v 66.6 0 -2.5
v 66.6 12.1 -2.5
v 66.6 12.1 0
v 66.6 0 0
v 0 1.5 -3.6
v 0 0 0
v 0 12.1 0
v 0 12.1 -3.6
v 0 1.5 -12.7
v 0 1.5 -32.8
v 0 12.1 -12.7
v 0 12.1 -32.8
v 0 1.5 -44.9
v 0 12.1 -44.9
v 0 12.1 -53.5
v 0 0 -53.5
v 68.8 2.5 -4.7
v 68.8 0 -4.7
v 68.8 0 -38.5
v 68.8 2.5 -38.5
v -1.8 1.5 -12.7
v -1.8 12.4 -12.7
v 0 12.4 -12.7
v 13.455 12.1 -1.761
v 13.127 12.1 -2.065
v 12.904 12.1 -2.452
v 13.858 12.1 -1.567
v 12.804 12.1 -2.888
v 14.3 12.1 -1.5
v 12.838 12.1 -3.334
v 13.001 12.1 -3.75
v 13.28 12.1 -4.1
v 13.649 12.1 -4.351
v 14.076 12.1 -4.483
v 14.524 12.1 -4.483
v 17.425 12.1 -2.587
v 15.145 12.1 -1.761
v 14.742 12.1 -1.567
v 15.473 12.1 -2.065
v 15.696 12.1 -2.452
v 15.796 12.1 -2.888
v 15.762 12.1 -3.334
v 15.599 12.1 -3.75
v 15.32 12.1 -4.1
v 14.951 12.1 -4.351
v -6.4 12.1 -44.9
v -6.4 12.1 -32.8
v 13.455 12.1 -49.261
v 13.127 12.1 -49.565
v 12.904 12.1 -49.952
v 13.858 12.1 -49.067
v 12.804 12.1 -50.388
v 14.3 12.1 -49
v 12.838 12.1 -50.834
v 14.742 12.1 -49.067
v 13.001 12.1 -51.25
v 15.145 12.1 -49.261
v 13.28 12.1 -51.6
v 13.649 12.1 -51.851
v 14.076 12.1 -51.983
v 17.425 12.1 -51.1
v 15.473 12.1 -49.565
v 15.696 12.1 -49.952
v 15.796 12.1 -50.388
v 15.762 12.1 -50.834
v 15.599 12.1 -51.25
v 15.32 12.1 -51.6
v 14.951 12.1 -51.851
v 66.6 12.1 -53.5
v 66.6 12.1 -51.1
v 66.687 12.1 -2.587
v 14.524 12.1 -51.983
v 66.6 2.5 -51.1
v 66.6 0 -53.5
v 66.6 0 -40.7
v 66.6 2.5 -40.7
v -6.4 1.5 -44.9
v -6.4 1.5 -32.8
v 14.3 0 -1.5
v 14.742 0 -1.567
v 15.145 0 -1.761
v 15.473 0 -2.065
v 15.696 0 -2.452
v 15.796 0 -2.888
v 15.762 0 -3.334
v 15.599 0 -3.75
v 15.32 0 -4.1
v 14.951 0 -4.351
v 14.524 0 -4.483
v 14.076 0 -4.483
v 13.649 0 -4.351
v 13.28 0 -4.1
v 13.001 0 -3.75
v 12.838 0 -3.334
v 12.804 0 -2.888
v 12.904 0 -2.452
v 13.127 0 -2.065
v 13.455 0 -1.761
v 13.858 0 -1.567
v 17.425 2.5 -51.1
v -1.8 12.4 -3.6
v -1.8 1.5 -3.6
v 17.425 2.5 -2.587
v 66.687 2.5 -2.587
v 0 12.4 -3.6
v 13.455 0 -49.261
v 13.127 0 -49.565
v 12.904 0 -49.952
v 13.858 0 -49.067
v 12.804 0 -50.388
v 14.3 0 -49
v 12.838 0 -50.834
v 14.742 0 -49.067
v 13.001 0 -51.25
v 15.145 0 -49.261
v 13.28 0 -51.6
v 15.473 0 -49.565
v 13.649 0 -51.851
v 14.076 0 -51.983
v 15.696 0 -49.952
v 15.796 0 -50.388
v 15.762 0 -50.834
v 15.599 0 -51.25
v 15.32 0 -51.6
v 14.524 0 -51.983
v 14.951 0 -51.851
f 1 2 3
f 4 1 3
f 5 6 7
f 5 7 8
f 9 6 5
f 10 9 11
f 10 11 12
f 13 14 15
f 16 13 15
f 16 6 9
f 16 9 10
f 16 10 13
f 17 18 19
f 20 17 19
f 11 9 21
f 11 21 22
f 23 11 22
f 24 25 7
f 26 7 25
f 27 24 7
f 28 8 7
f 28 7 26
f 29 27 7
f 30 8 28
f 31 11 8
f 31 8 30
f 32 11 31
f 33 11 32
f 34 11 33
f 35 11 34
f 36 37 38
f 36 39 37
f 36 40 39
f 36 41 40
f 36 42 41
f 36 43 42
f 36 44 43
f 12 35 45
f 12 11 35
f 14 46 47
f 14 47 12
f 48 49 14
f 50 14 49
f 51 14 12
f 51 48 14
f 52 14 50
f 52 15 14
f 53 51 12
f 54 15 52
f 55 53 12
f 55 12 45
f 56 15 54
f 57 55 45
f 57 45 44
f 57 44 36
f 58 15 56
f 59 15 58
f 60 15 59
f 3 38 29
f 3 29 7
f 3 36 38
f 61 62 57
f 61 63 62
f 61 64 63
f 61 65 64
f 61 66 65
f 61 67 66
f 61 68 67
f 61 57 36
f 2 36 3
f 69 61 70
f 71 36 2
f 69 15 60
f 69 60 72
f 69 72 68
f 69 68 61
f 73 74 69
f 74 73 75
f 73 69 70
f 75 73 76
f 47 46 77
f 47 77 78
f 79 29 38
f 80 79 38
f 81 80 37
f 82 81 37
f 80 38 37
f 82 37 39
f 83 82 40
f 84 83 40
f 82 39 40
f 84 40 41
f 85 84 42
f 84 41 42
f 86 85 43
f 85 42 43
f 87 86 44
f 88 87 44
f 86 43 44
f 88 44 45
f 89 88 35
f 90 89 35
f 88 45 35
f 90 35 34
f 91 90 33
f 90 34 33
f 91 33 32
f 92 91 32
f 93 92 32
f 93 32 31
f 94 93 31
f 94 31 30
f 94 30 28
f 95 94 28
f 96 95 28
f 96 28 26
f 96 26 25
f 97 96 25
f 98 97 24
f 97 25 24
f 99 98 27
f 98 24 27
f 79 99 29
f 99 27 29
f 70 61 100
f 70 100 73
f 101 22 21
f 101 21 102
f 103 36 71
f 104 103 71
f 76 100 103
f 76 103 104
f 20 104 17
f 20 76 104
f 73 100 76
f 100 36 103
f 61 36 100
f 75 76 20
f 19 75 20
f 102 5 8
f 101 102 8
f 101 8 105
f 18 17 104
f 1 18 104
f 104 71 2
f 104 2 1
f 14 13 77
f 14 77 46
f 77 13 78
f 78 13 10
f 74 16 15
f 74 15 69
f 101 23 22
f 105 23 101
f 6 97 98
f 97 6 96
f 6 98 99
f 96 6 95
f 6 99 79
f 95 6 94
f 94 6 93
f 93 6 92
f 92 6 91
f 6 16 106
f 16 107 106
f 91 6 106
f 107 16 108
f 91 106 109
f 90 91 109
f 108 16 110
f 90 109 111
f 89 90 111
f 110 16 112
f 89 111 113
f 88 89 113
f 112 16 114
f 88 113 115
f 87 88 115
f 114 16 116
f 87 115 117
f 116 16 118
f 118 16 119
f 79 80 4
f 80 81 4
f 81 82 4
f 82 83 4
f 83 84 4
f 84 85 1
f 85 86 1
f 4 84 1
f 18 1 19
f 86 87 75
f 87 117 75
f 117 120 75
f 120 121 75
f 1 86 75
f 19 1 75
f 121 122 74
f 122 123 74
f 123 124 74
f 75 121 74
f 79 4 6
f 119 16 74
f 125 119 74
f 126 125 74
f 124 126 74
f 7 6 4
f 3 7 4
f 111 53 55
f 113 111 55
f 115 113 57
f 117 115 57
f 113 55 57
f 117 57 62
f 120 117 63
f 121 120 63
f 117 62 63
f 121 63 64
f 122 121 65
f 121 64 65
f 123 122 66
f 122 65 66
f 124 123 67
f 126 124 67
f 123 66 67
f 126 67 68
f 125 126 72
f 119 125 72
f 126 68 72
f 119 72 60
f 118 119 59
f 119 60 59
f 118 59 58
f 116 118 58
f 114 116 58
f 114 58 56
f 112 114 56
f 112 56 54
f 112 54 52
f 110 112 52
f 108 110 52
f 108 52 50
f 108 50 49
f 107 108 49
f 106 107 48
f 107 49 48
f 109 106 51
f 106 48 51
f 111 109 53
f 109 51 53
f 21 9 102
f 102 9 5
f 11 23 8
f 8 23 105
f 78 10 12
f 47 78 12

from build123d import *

# Parameters (mm, degrees)
SKETCH2_W           = 68.8
SKETCH2_H           = 53.5
BOSS_EXTRUDE1_DEPTH = 12.1
CUT_EXTRUDE1_DEPTH  = 12.1
SKETCH4_W           = 12.1
SKETCH4_H           = 10.6
BOSS_EXTRUDE2_DEPTH = 6.4
SKETCH5_W           = 9.1
SKETCH5_H           = 10.9
BOSS_EXTRUDE3_DEPTH = 1.8
SKETCH7_R           = 1.5
CUT_EXTRUDE2_DEPTH  = 12.1
SKETCH8_W           = 66.515944673
SKETCH8_H           = 48.513400954
CUT_EXTRUDE3_DEPTH  = 9.6


with BuildPart() as part:
    # Sketch2 → Boss-Extrude1 (new body)
    with BuildSketch(Plane(origin=(0, 0, 0), x_dir=(1, 0, 0), z_dir=(0, 1, 0))):
        with Locations((34.4, 26.75)):
            Rectangle(SKETCH2_W, SKETCH2_H)
    extrude(amount=BOSS_EXTRUDE1_DEPTH)

    # Sketch3 → Cut-Extrude1 (cut)
    with BuildSketch(Plane(origin=(0, 12.1, 0), x_dir=(1, 0, 0), z_dir=(0, 1, 0))):
        Polygon((68.8, 0), (68.8, 4.7), (66.6, 2.5), (66.6, 0), align=None)
        Polygon((68.8, 53.5), (66.6, 53.5), (66.6, 40.7), (68.8, 38.5), align=None)
    extrude(amount=-CUT_EXTRUDE1_DEPTH, mode=Mode.SUBTRACT)

    # Sketch4 → Boss-Extrude2 (add)
    with BuildSketch(Plane.ZY):
        with Locations((-38.85, 6.8)):
            Rectangle(SKETCH4_W, SKETCH4_H)
    extrude(amount=BOSS_EXTRUDE2_DEPTH)

    # Sketch5 → Boss-Extrude3 (add)
    with BuildSketch(Plane.ZY):
        with Locations((-8.15, 6.95)):
            Rectangle(SKETCH5_W, SKETCH5_H)
    extrude(amount=BOSS_EXTRUDE3_DEPTH)

    # Sketch7 → Cut-Extrude2 (cut)
    with BuildSketch(Plane(origin=(0, 12.1, 0), x_dir=(1, 0, 0), z_dir=(0, 1, 0))):
        with Locations(Location((14.3, 50.5, 0), (0, 0, 270))):
            Circle(SKETCH7_R)
        with Locations(Location((14.3, 3, 0), (0, 0, 270))):
            Circle(SKETCH7_R)
    extrude(amount=-CUT_EXTRUDE2_DEPTH, mode=Mode.SUBTRACT)

    # Sketch8 → Cut-Extrude3 (cut)
    with BuildSketch(Plane(origin=(0, 12.1, 0), x_dir=(1, 0, 0), z_dir=(0, 1, 0))):
        with Locations((50.682931162, 26.843299523)):
            Rectangle(SKETCH8_W, SKETCH8_H)
    extrude(amount=-CUT_EXTRUDE3_DEPTH, mode=Mode.SUBTRACT)


solid = part.part
